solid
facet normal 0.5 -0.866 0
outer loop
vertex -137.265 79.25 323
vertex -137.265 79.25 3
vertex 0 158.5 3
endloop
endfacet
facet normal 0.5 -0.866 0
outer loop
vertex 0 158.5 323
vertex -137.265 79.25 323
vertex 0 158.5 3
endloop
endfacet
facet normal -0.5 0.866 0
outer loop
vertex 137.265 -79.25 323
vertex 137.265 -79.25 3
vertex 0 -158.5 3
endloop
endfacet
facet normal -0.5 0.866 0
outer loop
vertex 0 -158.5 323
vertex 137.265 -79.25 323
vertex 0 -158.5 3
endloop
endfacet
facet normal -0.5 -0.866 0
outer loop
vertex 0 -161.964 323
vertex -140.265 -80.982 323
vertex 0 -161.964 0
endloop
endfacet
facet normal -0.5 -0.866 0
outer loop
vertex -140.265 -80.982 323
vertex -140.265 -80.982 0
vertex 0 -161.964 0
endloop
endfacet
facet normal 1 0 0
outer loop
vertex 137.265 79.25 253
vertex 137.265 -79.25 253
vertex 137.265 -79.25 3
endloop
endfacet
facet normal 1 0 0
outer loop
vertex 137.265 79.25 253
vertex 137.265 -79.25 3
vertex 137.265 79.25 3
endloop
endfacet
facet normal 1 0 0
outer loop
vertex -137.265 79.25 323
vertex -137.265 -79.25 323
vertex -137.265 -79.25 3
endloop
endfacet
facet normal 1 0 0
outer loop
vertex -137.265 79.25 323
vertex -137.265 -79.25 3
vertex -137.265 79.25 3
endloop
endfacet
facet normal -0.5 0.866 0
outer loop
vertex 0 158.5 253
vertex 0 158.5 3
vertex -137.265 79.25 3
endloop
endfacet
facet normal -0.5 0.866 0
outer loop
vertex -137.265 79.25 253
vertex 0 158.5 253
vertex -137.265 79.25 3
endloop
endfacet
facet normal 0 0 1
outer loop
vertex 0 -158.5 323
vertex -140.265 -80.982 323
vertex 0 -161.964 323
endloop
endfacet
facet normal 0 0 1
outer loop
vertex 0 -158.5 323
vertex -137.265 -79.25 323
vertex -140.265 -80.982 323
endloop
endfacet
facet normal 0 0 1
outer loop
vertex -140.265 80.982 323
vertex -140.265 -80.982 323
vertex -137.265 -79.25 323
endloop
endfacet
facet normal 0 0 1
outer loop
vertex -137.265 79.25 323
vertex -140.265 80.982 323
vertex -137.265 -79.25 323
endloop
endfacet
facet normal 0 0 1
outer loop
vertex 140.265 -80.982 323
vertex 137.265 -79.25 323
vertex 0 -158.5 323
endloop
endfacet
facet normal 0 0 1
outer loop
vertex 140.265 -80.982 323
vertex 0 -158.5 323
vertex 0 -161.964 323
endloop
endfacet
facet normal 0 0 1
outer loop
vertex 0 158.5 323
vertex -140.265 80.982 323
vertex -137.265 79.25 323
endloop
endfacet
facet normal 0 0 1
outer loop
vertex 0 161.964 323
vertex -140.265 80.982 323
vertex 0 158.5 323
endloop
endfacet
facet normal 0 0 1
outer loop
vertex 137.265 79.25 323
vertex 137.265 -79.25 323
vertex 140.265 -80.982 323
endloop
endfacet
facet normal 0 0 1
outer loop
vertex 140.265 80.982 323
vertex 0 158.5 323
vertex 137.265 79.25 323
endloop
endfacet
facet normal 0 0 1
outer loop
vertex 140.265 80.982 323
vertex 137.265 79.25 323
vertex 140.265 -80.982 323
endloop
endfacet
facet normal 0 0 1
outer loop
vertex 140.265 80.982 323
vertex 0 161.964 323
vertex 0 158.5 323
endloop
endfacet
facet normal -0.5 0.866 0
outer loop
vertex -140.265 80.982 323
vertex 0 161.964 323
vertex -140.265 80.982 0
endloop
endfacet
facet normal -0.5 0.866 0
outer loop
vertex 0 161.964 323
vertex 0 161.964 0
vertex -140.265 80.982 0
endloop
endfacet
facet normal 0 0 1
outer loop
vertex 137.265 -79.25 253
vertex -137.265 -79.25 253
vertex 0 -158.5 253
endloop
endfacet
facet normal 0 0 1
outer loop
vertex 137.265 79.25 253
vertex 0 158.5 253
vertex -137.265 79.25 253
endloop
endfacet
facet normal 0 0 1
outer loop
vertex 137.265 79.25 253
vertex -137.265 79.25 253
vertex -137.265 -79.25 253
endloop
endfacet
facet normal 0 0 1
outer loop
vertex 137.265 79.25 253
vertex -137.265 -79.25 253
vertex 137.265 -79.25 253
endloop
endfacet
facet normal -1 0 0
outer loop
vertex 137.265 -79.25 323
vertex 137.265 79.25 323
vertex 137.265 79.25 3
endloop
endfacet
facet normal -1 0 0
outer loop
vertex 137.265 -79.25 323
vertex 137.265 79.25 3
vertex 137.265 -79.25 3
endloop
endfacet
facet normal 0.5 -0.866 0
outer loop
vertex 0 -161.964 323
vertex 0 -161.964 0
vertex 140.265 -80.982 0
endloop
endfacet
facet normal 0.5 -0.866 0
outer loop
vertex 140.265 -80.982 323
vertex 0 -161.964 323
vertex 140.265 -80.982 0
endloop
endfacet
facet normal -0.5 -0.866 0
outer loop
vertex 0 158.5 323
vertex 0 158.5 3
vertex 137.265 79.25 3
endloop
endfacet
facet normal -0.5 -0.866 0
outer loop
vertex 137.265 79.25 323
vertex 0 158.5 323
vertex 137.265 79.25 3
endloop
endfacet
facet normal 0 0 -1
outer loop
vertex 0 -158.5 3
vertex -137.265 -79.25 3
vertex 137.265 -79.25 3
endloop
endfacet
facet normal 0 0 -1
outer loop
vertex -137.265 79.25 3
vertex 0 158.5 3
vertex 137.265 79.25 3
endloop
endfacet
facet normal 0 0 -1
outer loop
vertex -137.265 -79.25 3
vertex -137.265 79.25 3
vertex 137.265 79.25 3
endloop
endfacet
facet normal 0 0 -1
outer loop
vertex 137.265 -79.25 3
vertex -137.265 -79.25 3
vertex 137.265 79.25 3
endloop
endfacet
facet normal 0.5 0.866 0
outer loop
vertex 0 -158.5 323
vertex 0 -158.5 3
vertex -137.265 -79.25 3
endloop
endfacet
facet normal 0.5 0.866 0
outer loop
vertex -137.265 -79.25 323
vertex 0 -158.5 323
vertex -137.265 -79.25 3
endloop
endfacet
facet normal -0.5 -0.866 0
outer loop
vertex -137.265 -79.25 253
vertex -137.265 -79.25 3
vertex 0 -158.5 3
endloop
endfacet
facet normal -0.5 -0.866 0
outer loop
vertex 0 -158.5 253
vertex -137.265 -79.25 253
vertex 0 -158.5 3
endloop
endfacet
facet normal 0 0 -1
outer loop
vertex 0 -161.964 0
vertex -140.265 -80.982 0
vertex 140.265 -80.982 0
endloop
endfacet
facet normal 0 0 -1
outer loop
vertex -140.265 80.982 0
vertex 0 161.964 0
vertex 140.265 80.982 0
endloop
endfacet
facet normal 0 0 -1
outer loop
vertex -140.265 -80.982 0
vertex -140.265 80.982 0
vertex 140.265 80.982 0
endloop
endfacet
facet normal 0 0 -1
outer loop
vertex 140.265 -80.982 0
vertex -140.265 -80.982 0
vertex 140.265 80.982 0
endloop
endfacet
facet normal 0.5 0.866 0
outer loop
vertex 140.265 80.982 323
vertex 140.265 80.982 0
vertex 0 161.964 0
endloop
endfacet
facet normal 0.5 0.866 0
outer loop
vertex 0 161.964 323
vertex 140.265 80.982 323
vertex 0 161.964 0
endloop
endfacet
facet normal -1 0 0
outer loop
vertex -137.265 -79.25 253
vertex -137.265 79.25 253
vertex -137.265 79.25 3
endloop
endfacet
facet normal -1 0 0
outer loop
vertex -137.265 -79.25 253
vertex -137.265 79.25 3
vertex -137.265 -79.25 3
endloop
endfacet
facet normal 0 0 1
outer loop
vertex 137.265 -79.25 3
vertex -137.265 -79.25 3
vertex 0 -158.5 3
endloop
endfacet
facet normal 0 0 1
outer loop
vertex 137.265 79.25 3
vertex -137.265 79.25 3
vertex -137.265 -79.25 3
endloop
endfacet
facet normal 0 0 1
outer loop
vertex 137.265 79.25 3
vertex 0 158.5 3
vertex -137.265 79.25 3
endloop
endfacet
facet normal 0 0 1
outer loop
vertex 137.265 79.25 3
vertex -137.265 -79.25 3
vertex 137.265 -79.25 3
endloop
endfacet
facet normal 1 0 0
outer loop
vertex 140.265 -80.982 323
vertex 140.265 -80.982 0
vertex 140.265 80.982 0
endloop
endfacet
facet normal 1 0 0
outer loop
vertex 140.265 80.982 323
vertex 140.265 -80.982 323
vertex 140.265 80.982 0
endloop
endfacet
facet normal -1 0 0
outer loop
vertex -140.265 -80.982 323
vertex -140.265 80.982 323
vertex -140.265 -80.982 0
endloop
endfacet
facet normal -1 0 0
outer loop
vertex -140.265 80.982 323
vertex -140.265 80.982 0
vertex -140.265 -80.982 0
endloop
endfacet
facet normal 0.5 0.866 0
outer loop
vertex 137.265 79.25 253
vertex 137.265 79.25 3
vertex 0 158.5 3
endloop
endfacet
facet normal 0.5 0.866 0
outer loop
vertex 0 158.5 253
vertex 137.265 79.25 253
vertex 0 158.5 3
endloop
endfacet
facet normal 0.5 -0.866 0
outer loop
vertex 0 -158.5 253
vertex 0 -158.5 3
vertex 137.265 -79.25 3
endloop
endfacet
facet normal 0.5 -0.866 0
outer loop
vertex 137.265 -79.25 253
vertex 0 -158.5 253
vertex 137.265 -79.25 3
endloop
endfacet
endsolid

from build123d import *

# Parameters (mm, degrees)
F1_DEPTH = 3
F3_DEPTH = 320
F5_DEPTH = 250


with BuildPart() as f1:
    # F0 (on Top) → F1 (new body)
    with BuildSketch(Plane.XY):
        Polygon((140.265026, 80.982051), (0, 161.964102), (-140.265026, 80.982051), (-140.265026, -80.982051), (0, -161.964102), (140.265026, -80.982051), align=None)
        Polygon((-137.265026, 79.25), (0, 158.5), (137.265026, 79.25), (137.265026, -79.25), (0, -158.5), (-137.265026, -79.25), align=None, mode=Mode.SUBTRACT)
        Polygon((137.265026, 79.25), (0, 158.5), (-137.265026, 79.25), (-137.265026, -79.25), (0, -158.5), (137.265026, -79.25), align=None)
    extrude(amount=F1_DEPTH)

    # F2 (on face) → F3 (join)
    with BuildSketch(Plane.XY.offset(3)):
        Polygon((140.265026, 80.982051), (0, 161.964102), (-140.265026, 80.982051), (-140.265026, -80.982051), (0, -161.964102), (140.265026, -80.982051), align=None)
        Polygon((-137.265026, 79.25), (0, 158.5), (137.265026, 79.25), (137.265026, -79.25), (0, -158.5), (-137.265026, -79.25), align=None, mode=Mode.SUBTRACT)
    extrude(amount=F3_DEPTH)


with BuildPart() as f5:
    # F4 (on face) → F5 (new body)
    with BuildSketch(Plane.XY.offset(3)):
        Polygon((137.265026, 79.25), (0, 158.5), (-137.265026, 79.25), (-137.265026, -79.25), (0, -158.5), (137.265026, -79.25), align=None)
    extrude(amount=F5_DEPTH)


solid = Compound([f1.part, f5.part])
